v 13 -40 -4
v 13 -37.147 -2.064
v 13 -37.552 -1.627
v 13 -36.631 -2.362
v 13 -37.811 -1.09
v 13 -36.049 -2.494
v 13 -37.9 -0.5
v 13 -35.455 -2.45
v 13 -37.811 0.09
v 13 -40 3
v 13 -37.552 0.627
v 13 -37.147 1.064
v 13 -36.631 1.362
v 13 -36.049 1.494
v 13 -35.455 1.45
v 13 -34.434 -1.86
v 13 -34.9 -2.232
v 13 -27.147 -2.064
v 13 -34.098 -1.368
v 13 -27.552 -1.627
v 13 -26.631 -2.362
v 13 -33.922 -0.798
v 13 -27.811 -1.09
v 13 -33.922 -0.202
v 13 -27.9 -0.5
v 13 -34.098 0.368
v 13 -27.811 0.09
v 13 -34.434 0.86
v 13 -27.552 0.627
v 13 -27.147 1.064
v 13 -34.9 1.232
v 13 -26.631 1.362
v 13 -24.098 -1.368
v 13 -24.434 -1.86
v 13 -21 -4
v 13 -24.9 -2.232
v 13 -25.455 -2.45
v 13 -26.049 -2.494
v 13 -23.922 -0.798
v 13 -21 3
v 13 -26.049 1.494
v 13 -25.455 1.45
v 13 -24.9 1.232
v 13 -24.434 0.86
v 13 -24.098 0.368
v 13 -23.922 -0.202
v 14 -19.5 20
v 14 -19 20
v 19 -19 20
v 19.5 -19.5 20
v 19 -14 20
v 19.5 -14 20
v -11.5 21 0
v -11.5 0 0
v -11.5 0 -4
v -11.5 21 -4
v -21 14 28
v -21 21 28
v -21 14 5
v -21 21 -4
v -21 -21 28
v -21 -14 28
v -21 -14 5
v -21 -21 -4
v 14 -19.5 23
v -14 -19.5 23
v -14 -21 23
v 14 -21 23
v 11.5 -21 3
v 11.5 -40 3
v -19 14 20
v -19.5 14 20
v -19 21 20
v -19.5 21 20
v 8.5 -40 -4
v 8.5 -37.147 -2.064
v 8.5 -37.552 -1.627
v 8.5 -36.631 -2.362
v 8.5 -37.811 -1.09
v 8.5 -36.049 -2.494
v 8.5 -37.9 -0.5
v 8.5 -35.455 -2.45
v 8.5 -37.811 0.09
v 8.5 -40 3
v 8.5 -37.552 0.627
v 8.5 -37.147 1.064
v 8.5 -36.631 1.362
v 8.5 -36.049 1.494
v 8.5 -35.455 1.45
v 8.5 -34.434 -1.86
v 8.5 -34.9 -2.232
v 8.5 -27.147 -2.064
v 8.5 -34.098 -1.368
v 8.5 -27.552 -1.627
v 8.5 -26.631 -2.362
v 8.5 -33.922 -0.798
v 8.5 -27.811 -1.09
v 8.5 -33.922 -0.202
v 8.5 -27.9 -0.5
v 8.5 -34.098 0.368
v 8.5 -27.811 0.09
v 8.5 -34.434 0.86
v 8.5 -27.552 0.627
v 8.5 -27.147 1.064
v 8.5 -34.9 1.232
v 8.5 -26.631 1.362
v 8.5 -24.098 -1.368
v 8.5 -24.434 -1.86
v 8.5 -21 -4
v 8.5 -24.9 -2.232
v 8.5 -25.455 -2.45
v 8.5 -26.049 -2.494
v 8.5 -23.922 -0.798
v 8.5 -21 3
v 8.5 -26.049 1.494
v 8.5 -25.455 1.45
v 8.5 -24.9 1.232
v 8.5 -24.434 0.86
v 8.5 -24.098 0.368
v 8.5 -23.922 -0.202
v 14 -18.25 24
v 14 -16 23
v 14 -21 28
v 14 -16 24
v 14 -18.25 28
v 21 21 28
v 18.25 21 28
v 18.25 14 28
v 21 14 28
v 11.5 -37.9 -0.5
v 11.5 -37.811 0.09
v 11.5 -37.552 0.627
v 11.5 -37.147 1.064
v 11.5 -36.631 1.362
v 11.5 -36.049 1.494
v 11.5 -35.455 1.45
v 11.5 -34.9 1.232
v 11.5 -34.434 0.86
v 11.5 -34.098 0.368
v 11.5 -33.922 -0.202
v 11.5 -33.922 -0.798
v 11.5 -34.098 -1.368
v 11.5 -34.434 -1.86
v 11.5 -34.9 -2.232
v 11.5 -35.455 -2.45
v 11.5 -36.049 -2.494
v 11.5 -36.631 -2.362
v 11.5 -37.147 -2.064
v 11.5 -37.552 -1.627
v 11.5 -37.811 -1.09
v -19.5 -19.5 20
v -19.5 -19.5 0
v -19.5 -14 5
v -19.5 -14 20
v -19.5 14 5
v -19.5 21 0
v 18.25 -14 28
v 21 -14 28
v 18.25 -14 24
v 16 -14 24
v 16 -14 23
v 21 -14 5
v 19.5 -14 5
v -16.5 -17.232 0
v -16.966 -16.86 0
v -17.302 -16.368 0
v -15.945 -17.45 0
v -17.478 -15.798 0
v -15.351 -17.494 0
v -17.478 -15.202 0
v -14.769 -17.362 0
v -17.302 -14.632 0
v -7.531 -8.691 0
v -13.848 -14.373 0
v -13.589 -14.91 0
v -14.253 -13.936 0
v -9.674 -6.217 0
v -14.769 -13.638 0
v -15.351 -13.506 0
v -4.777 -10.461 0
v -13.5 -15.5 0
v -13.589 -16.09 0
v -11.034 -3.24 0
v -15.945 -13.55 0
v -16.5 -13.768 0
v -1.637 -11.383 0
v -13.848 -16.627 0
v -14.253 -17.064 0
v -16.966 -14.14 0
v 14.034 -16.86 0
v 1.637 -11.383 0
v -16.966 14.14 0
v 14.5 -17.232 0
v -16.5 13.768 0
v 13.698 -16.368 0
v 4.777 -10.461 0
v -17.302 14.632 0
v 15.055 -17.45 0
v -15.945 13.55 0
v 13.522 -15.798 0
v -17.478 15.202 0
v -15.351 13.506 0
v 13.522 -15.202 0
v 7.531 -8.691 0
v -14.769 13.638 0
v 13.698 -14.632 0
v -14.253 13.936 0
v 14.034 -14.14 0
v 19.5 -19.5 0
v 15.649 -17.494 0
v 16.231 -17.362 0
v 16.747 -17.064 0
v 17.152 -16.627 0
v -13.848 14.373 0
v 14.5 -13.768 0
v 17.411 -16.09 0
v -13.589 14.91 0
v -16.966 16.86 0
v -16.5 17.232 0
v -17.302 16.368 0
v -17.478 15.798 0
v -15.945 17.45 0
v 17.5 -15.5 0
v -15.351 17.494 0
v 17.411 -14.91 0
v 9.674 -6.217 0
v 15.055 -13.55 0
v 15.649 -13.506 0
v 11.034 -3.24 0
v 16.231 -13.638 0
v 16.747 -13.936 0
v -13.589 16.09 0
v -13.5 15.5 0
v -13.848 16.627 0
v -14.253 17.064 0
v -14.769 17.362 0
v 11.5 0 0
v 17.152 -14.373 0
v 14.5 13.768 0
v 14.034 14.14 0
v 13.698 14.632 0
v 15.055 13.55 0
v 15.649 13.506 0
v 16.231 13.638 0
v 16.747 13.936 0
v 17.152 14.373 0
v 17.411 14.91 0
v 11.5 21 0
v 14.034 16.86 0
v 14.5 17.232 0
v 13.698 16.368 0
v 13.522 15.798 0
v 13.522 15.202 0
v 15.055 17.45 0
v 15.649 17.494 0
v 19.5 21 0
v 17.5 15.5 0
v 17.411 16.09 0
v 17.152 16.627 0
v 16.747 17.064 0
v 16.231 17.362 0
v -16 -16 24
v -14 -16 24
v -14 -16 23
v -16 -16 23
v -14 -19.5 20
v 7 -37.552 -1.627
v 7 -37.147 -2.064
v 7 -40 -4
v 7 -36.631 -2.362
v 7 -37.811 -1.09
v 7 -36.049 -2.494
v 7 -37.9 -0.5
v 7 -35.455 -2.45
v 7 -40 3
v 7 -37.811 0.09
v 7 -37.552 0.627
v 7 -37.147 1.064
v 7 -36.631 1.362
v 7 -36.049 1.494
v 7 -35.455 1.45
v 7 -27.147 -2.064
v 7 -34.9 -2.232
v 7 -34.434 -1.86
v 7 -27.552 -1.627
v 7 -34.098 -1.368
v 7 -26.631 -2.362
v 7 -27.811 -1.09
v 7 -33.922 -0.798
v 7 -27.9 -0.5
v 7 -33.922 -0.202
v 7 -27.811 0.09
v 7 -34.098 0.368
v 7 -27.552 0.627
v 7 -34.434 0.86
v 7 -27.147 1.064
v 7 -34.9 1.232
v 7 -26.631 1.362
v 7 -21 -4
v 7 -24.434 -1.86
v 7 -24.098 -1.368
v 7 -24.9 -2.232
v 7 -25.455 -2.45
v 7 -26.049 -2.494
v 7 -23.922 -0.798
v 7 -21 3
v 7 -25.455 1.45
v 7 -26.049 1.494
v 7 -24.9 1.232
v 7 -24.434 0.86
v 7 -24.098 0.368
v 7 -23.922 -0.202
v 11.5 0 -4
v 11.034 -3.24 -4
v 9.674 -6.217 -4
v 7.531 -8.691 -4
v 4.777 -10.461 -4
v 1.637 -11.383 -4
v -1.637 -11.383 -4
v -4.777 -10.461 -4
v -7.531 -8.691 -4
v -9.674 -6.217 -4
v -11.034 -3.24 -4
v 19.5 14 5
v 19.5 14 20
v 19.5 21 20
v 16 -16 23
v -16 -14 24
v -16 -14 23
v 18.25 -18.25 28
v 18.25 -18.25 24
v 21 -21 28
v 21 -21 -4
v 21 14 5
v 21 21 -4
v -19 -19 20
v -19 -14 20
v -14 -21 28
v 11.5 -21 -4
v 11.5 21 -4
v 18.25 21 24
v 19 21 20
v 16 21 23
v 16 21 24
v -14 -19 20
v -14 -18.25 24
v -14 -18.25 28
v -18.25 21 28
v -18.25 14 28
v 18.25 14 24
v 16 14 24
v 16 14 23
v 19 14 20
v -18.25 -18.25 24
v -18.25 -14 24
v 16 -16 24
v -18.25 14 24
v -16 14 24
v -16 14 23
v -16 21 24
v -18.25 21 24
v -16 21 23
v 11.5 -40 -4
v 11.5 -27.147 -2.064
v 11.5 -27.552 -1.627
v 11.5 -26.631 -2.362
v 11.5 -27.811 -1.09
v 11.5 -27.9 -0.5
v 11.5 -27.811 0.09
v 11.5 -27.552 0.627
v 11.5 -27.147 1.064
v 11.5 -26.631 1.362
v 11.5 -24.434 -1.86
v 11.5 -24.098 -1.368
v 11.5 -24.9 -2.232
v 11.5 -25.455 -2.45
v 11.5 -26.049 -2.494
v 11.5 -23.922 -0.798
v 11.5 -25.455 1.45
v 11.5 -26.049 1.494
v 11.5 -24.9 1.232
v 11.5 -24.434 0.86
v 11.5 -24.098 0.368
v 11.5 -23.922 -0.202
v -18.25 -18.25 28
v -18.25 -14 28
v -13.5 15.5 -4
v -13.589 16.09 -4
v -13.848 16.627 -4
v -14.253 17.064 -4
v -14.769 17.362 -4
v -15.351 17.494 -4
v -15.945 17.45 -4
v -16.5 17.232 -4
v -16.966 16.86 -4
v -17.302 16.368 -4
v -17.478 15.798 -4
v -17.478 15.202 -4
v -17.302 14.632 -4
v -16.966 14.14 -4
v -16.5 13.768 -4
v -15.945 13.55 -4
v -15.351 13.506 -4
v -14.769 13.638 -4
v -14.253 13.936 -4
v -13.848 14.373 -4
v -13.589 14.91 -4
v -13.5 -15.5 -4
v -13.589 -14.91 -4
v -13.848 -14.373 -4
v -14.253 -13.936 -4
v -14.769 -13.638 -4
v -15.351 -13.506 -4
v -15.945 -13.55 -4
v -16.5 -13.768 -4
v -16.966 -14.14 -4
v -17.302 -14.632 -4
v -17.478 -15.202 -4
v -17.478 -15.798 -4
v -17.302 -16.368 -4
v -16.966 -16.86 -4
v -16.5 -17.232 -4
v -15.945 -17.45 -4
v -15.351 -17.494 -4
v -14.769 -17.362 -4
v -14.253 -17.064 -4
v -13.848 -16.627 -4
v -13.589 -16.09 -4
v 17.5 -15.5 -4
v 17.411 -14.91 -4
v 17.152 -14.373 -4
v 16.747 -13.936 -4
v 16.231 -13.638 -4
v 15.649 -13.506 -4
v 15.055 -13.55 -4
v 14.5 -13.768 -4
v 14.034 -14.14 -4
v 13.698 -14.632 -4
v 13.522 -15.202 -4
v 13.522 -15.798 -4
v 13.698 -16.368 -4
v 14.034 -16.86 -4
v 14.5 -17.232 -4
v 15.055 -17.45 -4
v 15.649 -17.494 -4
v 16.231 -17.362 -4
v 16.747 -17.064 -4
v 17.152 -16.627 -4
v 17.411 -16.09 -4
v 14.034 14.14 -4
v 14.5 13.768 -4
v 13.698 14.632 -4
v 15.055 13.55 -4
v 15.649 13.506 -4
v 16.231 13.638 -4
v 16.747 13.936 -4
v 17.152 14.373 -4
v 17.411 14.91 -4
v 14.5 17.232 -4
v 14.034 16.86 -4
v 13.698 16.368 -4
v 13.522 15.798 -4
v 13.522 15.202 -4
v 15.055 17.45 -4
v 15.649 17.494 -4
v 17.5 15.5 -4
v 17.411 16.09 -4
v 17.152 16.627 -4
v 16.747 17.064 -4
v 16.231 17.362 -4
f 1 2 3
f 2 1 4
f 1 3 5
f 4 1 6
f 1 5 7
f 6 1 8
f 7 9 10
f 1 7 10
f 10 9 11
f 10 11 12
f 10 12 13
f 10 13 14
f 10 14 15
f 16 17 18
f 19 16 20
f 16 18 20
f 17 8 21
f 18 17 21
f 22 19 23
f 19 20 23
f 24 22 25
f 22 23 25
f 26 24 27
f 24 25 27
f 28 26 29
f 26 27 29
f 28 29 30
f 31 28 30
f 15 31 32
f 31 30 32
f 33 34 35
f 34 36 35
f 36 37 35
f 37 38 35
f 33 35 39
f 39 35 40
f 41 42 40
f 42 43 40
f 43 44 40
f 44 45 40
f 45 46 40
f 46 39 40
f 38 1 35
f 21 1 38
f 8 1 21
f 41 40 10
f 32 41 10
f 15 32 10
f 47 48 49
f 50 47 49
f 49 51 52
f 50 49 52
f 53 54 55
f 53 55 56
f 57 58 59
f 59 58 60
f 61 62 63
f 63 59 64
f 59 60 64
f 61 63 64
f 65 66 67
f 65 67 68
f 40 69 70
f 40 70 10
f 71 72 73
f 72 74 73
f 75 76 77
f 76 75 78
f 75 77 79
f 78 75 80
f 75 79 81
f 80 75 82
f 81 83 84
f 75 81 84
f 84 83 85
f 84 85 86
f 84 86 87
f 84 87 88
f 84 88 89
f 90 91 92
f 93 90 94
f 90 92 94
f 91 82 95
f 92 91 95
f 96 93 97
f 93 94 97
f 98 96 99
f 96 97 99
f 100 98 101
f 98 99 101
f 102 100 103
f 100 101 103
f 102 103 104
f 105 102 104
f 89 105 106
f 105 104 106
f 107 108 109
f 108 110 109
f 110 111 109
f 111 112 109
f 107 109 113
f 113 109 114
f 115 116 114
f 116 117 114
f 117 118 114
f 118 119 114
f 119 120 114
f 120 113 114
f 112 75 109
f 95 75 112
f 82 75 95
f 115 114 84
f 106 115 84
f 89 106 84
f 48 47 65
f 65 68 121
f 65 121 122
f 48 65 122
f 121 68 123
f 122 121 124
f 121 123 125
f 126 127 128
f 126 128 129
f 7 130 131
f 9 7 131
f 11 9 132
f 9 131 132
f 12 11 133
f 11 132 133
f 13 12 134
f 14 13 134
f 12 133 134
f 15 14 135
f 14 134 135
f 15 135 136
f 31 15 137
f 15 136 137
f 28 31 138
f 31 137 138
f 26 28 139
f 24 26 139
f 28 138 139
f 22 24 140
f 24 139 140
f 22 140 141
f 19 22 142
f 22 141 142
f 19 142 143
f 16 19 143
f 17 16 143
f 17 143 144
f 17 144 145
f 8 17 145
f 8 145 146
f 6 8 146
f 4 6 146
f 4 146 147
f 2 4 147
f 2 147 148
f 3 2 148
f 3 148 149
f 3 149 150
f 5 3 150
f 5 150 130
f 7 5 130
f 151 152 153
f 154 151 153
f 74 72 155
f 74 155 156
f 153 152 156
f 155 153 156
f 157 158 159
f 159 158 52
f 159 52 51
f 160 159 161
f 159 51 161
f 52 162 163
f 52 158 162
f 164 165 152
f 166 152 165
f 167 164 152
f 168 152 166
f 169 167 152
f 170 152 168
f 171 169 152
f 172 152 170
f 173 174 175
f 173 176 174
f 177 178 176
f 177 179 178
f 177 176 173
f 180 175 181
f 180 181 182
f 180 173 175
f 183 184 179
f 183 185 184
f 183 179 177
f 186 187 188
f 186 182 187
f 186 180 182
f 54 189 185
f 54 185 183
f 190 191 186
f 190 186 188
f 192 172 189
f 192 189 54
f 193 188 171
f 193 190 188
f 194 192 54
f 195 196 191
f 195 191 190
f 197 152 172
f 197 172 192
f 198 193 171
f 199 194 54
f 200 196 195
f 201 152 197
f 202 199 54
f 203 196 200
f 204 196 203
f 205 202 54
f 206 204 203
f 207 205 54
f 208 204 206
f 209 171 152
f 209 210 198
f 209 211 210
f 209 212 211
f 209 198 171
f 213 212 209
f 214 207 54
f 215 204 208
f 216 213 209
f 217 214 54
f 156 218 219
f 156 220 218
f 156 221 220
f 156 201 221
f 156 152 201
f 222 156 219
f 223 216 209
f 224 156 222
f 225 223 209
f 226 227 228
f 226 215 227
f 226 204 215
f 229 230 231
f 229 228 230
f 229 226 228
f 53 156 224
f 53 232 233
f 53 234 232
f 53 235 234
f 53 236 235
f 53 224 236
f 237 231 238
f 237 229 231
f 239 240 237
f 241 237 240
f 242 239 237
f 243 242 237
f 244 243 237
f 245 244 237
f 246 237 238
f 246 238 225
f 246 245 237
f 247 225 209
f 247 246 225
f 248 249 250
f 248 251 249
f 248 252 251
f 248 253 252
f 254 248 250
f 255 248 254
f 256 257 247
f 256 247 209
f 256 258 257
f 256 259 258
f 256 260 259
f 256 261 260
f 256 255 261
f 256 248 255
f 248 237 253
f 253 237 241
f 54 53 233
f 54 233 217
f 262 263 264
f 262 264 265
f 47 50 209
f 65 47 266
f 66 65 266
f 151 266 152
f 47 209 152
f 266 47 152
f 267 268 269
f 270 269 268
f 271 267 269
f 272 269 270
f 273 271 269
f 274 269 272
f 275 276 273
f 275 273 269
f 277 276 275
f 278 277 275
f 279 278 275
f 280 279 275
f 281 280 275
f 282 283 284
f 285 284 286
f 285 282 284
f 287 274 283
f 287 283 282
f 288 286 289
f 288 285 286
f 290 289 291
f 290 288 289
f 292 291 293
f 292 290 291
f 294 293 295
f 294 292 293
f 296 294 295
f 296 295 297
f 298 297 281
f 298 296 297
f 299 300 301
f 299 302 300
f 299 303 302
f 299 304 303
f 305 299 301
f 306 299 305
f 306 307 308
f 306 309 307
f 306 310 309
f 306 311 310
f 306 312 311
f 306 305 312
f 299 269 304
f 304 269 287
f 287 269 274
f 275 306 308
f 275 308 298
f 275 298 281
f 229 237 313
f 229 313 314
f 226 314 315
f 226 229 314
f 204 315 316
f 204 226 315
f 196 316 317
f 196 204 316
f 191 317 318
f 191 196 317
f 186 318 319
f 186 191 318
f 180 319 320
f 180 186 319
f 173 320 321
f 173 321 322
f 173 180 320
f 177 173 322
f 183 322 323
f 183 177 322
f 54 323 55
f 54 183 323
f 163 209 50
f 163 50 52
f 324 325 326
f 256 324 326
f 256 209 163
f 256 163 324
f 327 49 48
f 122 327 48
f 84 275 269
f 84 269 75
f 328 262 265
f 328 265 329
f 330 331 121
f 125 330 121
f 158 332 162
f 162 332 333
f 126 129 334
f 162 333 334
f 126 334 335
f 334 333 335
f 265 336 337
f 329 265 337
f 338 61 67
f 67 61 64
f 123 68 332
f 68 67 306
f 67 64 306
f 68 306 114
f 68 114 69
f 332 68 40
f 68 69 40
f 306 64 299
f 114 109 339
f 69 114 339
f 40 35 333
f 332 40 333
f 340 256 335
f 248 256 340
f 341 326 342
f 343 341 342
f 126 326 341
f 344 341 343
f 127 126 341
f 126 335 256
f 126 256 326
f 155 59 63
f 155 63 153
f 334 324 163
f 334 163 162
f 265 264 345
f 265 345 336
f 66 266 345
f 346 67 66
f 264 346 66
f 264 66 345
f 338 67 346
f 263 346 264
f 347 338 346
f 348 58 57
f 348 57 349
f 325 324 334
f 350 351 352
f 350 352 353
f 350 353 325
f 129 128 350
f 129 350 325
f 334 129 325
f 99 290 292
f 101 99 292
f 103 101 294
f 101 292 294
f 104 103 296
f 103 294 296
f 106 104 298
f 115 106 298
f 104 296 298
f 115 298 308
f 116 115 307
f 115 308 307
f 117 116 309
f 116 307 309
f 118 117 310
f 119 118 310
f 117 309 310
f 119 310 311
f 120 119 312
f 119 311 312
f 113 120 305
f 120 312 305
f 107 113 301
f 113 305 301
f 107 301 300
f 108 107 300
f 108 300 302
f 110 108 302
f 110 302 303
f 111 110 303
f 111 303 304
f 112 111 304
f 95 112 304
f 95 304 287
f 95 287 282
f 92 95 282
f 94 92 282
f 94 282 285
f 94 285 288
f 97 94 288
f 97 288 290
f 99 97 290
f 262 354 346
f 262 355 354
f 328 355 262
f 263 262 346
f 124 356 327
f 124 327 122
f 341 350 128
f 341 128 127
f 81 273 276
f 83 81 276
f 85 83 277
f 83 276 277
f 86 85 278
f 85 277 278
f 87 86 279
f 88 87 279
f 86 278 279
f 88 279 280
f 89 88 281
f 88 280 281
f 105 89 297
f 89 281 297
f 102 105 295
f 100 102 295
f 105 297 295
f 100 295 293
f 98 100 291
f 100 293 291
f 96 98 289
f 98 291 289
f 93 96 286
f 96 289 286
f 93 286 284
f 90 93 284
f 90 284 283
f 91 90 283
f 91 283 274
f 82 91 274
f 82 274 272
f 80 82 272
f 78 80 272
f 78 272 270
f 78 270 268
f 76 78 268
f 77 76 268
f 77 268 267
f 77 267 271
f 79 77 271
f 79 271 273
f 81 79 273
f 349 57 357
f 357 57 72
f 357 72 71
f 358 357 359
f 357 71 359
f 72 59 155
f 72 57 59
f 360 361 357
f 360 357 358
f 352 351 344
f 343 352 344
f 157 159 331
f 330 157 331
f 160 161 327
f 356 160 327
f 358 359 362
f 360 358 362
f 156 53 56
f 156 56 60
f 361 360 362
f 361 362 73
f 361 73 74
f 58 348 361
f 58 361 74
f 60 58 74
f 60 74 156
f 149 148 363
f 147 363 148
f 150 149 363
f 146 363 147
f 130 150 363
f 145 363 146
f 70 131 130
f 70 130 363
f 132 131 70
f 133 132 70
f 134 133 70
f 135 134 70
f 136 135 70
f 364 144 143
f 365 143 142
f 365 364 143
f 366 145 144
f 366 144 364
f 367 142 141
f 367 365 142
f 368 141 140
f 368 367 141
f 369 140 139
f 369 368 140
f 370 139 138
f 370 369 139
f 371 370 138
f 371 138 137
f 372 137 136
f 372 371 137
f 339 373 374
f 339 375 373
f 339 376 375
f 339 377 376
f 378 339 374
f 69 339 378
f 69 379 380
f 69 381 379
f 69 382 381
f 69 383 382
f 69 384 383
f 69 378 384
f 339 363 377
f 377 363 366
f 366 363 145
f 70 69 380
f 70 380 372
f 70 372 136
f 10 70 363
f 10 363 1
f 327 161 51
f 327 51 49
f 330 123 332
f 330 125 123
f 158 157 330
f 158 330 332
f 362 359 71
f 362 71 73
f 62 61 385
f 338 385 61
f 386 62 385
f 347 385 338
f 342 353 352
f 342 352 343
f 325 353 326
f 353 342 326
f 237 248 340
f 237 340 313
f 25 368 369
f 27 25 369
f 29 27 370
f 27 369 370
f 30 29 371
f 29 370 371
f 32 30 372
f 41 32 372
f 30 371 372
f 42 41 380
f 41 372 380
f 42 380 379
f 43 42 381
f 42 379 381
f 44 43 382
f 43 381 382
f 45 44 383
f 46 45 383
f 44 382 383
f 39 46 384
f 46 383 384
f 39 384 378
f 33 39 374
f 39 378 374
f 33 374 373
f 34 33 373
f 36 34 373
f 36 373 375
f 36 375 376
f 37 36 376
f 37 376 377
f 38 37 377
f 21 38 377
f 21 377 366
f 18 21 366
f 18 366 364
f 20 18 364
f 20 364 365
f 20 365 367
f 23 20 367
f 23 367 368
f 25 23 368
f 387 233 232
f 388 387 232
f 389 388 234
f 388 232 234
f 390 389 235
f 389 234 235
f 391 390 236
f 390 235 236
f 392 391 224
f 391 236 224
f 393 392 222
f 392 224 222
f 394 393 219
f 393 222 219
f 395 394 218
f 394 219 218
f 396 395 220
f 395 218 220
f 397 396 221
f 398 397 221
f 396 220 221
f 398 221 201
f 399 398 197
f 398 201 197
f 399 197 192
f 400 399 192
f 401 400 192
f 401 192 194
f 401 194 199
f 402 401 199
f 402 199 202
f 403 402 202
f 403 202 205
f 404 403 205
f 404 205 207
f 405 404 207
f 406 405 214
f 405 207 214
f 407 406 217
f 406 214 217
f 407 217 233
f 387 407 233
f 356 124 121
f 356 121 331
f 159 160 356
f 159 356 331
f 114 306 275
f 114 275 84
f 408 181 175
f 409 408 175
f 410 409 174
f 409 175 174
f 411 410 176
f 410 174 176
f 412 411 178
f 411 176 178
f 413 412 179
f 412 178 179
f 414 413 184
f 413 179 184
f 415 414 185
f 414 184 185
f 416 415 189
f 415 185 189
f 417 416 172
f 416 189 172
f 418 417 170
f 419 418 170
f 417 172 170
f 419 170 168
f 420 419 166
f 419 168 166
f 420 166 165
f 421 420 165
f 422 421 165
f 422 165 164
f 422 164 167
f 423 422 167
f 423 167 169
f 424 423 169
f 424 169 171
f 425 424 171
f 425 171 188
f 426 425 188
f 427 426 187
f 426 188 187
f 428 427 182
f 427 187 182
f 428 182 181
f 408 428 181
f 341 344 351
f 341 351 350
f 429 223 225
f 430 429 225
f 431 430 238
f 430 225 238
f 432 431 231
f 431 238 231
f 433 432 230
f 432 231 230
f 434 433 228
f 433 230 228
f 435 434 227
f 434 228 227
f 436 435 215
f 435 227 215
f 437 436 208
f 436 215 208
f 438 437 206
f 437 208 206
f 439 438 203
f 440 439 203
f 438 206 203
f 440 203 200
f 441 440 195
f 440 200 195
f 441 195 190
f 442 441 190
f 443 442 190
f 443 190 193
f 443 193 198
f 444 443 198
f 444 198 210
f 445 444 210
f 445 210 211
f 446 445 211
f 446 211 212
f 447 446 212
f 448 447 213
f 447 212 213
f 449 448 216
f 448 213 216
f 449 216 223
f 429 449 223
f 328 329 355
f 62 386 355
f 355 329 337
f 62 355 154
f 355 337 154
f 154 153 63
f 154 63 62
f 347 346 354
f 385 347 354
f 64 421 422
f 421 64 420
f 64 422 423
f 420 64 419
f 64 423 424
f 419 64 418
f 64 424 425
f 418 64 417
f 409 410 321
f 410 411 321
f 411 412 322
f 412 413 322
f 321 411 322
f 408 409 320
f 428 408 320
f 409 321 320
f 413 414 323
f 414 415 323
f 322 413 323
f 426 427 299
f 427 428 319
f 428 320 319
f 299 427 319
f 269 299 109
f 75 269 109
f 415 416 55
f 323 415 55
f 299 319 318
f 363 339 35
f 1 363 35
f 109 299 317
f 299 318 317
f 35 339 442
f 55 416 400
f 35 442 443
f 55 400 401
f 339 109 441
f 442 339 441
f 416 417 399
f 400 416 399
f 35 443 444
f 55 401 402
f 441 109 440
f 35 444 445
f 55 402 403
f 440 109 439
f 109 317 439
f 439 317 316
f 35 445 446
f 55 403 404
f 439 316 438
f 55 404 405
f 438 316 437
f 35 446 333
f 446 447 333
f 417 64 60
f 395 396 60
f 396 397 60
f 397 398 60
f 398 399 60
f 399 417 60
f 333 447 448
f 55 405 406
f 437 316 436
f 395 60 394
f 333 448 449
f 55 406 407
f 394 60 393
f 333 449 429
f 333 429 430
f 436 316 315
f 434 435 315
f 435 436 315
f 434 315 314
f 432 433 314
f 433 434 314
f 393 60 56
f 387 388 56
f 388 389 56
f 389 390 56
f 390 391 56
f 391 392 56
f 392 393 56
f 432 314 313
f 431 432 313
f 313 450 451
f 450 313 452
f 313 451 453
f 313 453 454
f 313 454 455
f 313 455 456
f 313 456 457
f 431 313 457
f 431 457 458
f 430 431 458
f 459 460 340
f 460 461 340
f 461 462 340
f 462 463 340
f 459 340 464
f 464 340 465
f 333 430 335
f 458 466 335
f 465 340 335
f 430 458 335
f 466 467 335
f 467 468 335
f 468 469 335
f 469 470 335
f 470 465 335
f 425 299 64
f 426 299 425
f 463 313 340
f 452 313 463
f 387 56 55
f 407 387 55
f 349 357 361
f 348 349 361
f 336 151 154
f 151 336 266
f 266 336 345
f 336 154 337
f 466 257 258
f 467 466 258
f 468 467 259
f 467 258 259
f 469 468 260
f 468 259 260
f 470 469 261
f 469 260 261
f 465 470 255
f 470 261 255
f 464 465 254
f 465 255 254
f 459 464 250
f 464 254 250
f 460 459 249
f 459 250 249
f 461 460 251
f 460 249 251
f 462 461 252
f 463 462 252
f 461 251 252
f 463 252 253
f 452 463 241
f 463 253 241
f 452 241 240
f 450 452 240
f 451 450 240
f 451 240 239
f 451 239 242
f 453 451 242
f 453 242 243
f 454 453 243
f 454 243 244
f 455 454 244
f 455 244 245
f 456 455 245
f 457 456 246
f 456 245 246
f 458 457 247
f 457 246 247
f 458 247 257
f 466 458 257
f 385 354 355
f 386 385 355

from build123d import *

# Parameters (mm, degrees)
F0_R      = 2
F0_W      = 1.5
F0_H      = 28
F0_W_2    = 28
F0_H_2    = 1.5
F0_W_3    = 8
F1_DEPTH  = 4
F2_DEPTH  = 23
F3_DEPTH  = 5
F4_W      = 2.75
F4_H      = 7
F5_DEPTH  = 5
F4_W_2    = 2.25
F6_DEPTH  = 1
F7_DEPTH  = 3
F8_SIZE   = 3
F9_W      = 1.5
F9_H      = 7
F10_DEPTH = 19
F11_R     = 2
F12_DEPTH = 14.001


# Not quite as in the source:
# - a feature names something its author has since deleted; it is built from what else it names


with BuildPart() as f1:
    # F0 (on Top) → F1 (new body)
    with BuildSketch(Plane.XY):
        with BuildLine():
            Line((-11.5, 19.5), (-19.5, 19.5))
            Line((-19.5, 19.5), (-19.5, 14))
            Line((-19.5, 14), (-19.5, -14))
            Line((-19.5, -14), (-19.5, -19.5))
            Line((-19.5, -19.5), (-14, -19.5))
            Line((-14, -19.5), (14, -19.5))
            Line((14, -19.5), (19.5, -19.5))
            Line((19.5, -19.5), (19.5, -14))
            Line((19.5, -14), (19.5, 14))
            Line((19.5, 14), (19.5, 19.5))
            Line((19.5, 19.5), (11.5, 19.5))
            Line((11.5, 19.5), (11.5, 0))
            ThreePointArc((11.5, 0), (0, -11.5), (-11.5, 0))
            Line((-11.5, 0), (-11.5, 19.5))
        make_face()
        with Locations((-15.5, -15.5)):
            Circle(F0_R, mode=Mode.SUBTRACT)
        with Locations((15.5, -15.5)):
            Circle(F0_R, mode=Mode.SUBTRACT)
        with Locations((-15.5, 15.5)):
            Circle(F0_R, mode=Mode.SUBTRACT)
        with Locations((15.5, 15.5)):
            Circle(F0_R, mode=Mode.SUBTRACT)
        with Locations((-20.25, 0)):
            Rectangle(F0_W, F0_H)
        Polygon((19.5, 21), (19.5, 19.5), (19.5, 14), (21, 14), (21, 21), align=None)
        Polygon((21, -14), (19.5, -14), (19.5, -19.5), (14, -19.5), (14, -21), (21, -21), align=None)
        Polygon((-19.5, -19.5), (-19.5, -14), (-21, -14), (-21, -21), (-14, -21), (-14, -19.5), align=None)
        Polygon((-19.5, 14), (-19.5, 19.5), (-19.5, 21), (-21, 21), (-21, 14), align=None)
        with Locations((20.25, 0)):
            Rectangle(F0_W, F0_H)
        with Locations((0, -20.25)):
            Rectangle(F0_W_2, F0_H_2)
        with Locations((-15.5, 20.25)):
            Rectangle(F0_W_3, F0_H_2)
        with Locations((15.5, 20.25)):
            Rectangle(F0_W_3, F0_H_2)
    extrude(amount=-F1_DEPTH)

    # F0 (on Top) → F2 (join)
    with BuildSketch(Plane.XY):
        Polygon((-19.5, -19.5), (-19.5, -14), (-21, -14), (-21, -21), (-14, -21), (-14, -19.5), align=None)
        Polygon((21, -14), (19.5, -14), (19.5, -19.5), (14, -19.5), (14, -21), (21, -21), align=None)
        Polygon((-19.5, 14), (-19.5, 19.5), (-19.5, 21), (-21, 21), (-21, 14), align=None)
        Polygon((19.5, 21), (19.5, 19.5), (19.5, 14), (21, 14), (21, 21), align=None)
        with Locations((0, -20.25)):
            Rectangle(F0_W_2, F0_H_2)
    extrude(amount=F2_DEPTH)

    # F0 (on Top) → F3 (join)
    with BuildSketch(Plane.XY):
        with Locations((20.25, 0)):
            Rectangle(F0_W, F0_H)
        with Locations((-20.25, 0)):
            Rectangle(F0_W, F0_H)
    extrude(amount=F3_DEPTH)

    # F4 (on face) → F5 (join)
    with BuildSketch(Plane.XY.offset(23)):
        with Locations((19.625, 17.5)):
            Rectangle(F4_W, F4_H)
        Polygon((14, -19.5), (14, -21), (21, -21), (21, -14), (19.5, -14), (19.5, -19.5), align=None)
        Polygon((-19.5, -19.5), (-21, -21), (-14, -21), (-14, -19.5), align=None)
        Polygon((-18.25, -18.25), (-19.5, -19.5), (-14, -19.5), (-14, -18.25), align=None)
        Polygon((-18.25, -14), (-19.5, -14), (-19.5, -19.5), (-18.25, -18.25), align=None)
        Polygon((-19.5, -14), (-21, -14), (-21, -21), (-19.5, -19.5), align=None)
        with Locations((-19.625, 17.5)):
            Rectangle(F4_W, F4_H)
        Polygon((14, -18.25), (14, -19.5), (19.5, -19.5), (19.5, -14), (18.25, -14), (18.25, -18.25), align=None)
    extrude(amount=F5_DEPTH)

    # F4 (on face) → F6 (join)
    with BuildSketch(Plane.XY.offset(23)):
        with Locations((17.125, 17.5)):
            Rectangle(F4_W_2, F4_H)
        Polygon((14, -16), (14, -18.25), (18.25, -18.25), (18.25, -14), (16, -14), (16, -16), align=None)
        Polygon((-16, -16), (-18.25, -18.25), (-14, -18.25), (-14, -16), align=None)
        Polygon((-16, -14), (-18.25, -14), (-18.25, -18.25), (-16, -16), align=None)
        with Locations((-17.125, 17.5)):
            Rectangle(F4_W_2, F4_H)
    extrude(amount=F6_DEPTH)

    # F7 (add): faces of the model
    f7_faces = [f1.faces().sort_by_distance(p)[0] for p in [
        (17.75, 17.5, 23),
        (17.0166666667, -17.0166666667, 23),
        (-17.0166666667, -17.0166666667, 23),
        (-17.75, 17.5, 23),
    ]]
    extrude(f7_faces, amount=F7_DEPTH)

    # F8
    f8_edges = [f1.edges().sort_by_distance(p)[0] for p in [
        (16, 17.5, 20),
        (15, -16, 20),
        (16, -15, 20),
        (-15, -16, 20),
        (-16, -15, 20),
        (-16, 17.5, 20),
    ]]
    chamfer(f8_edges, length=F8_SIZE)

    # F9 (on face) → F10 (join)
    with BuildSketch(Plane.XZ.offset(21)):
        with Locations((7.75, -0.5)):
            Rectangle(F9_W, F9_H)
        with Locations((12.25, -0.5)):
            Rectangle(F9_W, F9_H)
    extrude(amount=F10_DEPTH)

    # F11 (on face) → F12 (cut, through all)
    with BuildSketch(Plane(origin=(7, 0, 0), x_dir=(0, -1, 0), z_dir=(-1, 0, 0))):
        with Locations((25.9, -0.5)):
            Circle(F11_R)
        with Locations((35.9, -0.5)):
            Circle(F11_R)
    extrude(amount=-F12_DEPTH, mode=Mode.SUBTRACT)


solid = f1.part
